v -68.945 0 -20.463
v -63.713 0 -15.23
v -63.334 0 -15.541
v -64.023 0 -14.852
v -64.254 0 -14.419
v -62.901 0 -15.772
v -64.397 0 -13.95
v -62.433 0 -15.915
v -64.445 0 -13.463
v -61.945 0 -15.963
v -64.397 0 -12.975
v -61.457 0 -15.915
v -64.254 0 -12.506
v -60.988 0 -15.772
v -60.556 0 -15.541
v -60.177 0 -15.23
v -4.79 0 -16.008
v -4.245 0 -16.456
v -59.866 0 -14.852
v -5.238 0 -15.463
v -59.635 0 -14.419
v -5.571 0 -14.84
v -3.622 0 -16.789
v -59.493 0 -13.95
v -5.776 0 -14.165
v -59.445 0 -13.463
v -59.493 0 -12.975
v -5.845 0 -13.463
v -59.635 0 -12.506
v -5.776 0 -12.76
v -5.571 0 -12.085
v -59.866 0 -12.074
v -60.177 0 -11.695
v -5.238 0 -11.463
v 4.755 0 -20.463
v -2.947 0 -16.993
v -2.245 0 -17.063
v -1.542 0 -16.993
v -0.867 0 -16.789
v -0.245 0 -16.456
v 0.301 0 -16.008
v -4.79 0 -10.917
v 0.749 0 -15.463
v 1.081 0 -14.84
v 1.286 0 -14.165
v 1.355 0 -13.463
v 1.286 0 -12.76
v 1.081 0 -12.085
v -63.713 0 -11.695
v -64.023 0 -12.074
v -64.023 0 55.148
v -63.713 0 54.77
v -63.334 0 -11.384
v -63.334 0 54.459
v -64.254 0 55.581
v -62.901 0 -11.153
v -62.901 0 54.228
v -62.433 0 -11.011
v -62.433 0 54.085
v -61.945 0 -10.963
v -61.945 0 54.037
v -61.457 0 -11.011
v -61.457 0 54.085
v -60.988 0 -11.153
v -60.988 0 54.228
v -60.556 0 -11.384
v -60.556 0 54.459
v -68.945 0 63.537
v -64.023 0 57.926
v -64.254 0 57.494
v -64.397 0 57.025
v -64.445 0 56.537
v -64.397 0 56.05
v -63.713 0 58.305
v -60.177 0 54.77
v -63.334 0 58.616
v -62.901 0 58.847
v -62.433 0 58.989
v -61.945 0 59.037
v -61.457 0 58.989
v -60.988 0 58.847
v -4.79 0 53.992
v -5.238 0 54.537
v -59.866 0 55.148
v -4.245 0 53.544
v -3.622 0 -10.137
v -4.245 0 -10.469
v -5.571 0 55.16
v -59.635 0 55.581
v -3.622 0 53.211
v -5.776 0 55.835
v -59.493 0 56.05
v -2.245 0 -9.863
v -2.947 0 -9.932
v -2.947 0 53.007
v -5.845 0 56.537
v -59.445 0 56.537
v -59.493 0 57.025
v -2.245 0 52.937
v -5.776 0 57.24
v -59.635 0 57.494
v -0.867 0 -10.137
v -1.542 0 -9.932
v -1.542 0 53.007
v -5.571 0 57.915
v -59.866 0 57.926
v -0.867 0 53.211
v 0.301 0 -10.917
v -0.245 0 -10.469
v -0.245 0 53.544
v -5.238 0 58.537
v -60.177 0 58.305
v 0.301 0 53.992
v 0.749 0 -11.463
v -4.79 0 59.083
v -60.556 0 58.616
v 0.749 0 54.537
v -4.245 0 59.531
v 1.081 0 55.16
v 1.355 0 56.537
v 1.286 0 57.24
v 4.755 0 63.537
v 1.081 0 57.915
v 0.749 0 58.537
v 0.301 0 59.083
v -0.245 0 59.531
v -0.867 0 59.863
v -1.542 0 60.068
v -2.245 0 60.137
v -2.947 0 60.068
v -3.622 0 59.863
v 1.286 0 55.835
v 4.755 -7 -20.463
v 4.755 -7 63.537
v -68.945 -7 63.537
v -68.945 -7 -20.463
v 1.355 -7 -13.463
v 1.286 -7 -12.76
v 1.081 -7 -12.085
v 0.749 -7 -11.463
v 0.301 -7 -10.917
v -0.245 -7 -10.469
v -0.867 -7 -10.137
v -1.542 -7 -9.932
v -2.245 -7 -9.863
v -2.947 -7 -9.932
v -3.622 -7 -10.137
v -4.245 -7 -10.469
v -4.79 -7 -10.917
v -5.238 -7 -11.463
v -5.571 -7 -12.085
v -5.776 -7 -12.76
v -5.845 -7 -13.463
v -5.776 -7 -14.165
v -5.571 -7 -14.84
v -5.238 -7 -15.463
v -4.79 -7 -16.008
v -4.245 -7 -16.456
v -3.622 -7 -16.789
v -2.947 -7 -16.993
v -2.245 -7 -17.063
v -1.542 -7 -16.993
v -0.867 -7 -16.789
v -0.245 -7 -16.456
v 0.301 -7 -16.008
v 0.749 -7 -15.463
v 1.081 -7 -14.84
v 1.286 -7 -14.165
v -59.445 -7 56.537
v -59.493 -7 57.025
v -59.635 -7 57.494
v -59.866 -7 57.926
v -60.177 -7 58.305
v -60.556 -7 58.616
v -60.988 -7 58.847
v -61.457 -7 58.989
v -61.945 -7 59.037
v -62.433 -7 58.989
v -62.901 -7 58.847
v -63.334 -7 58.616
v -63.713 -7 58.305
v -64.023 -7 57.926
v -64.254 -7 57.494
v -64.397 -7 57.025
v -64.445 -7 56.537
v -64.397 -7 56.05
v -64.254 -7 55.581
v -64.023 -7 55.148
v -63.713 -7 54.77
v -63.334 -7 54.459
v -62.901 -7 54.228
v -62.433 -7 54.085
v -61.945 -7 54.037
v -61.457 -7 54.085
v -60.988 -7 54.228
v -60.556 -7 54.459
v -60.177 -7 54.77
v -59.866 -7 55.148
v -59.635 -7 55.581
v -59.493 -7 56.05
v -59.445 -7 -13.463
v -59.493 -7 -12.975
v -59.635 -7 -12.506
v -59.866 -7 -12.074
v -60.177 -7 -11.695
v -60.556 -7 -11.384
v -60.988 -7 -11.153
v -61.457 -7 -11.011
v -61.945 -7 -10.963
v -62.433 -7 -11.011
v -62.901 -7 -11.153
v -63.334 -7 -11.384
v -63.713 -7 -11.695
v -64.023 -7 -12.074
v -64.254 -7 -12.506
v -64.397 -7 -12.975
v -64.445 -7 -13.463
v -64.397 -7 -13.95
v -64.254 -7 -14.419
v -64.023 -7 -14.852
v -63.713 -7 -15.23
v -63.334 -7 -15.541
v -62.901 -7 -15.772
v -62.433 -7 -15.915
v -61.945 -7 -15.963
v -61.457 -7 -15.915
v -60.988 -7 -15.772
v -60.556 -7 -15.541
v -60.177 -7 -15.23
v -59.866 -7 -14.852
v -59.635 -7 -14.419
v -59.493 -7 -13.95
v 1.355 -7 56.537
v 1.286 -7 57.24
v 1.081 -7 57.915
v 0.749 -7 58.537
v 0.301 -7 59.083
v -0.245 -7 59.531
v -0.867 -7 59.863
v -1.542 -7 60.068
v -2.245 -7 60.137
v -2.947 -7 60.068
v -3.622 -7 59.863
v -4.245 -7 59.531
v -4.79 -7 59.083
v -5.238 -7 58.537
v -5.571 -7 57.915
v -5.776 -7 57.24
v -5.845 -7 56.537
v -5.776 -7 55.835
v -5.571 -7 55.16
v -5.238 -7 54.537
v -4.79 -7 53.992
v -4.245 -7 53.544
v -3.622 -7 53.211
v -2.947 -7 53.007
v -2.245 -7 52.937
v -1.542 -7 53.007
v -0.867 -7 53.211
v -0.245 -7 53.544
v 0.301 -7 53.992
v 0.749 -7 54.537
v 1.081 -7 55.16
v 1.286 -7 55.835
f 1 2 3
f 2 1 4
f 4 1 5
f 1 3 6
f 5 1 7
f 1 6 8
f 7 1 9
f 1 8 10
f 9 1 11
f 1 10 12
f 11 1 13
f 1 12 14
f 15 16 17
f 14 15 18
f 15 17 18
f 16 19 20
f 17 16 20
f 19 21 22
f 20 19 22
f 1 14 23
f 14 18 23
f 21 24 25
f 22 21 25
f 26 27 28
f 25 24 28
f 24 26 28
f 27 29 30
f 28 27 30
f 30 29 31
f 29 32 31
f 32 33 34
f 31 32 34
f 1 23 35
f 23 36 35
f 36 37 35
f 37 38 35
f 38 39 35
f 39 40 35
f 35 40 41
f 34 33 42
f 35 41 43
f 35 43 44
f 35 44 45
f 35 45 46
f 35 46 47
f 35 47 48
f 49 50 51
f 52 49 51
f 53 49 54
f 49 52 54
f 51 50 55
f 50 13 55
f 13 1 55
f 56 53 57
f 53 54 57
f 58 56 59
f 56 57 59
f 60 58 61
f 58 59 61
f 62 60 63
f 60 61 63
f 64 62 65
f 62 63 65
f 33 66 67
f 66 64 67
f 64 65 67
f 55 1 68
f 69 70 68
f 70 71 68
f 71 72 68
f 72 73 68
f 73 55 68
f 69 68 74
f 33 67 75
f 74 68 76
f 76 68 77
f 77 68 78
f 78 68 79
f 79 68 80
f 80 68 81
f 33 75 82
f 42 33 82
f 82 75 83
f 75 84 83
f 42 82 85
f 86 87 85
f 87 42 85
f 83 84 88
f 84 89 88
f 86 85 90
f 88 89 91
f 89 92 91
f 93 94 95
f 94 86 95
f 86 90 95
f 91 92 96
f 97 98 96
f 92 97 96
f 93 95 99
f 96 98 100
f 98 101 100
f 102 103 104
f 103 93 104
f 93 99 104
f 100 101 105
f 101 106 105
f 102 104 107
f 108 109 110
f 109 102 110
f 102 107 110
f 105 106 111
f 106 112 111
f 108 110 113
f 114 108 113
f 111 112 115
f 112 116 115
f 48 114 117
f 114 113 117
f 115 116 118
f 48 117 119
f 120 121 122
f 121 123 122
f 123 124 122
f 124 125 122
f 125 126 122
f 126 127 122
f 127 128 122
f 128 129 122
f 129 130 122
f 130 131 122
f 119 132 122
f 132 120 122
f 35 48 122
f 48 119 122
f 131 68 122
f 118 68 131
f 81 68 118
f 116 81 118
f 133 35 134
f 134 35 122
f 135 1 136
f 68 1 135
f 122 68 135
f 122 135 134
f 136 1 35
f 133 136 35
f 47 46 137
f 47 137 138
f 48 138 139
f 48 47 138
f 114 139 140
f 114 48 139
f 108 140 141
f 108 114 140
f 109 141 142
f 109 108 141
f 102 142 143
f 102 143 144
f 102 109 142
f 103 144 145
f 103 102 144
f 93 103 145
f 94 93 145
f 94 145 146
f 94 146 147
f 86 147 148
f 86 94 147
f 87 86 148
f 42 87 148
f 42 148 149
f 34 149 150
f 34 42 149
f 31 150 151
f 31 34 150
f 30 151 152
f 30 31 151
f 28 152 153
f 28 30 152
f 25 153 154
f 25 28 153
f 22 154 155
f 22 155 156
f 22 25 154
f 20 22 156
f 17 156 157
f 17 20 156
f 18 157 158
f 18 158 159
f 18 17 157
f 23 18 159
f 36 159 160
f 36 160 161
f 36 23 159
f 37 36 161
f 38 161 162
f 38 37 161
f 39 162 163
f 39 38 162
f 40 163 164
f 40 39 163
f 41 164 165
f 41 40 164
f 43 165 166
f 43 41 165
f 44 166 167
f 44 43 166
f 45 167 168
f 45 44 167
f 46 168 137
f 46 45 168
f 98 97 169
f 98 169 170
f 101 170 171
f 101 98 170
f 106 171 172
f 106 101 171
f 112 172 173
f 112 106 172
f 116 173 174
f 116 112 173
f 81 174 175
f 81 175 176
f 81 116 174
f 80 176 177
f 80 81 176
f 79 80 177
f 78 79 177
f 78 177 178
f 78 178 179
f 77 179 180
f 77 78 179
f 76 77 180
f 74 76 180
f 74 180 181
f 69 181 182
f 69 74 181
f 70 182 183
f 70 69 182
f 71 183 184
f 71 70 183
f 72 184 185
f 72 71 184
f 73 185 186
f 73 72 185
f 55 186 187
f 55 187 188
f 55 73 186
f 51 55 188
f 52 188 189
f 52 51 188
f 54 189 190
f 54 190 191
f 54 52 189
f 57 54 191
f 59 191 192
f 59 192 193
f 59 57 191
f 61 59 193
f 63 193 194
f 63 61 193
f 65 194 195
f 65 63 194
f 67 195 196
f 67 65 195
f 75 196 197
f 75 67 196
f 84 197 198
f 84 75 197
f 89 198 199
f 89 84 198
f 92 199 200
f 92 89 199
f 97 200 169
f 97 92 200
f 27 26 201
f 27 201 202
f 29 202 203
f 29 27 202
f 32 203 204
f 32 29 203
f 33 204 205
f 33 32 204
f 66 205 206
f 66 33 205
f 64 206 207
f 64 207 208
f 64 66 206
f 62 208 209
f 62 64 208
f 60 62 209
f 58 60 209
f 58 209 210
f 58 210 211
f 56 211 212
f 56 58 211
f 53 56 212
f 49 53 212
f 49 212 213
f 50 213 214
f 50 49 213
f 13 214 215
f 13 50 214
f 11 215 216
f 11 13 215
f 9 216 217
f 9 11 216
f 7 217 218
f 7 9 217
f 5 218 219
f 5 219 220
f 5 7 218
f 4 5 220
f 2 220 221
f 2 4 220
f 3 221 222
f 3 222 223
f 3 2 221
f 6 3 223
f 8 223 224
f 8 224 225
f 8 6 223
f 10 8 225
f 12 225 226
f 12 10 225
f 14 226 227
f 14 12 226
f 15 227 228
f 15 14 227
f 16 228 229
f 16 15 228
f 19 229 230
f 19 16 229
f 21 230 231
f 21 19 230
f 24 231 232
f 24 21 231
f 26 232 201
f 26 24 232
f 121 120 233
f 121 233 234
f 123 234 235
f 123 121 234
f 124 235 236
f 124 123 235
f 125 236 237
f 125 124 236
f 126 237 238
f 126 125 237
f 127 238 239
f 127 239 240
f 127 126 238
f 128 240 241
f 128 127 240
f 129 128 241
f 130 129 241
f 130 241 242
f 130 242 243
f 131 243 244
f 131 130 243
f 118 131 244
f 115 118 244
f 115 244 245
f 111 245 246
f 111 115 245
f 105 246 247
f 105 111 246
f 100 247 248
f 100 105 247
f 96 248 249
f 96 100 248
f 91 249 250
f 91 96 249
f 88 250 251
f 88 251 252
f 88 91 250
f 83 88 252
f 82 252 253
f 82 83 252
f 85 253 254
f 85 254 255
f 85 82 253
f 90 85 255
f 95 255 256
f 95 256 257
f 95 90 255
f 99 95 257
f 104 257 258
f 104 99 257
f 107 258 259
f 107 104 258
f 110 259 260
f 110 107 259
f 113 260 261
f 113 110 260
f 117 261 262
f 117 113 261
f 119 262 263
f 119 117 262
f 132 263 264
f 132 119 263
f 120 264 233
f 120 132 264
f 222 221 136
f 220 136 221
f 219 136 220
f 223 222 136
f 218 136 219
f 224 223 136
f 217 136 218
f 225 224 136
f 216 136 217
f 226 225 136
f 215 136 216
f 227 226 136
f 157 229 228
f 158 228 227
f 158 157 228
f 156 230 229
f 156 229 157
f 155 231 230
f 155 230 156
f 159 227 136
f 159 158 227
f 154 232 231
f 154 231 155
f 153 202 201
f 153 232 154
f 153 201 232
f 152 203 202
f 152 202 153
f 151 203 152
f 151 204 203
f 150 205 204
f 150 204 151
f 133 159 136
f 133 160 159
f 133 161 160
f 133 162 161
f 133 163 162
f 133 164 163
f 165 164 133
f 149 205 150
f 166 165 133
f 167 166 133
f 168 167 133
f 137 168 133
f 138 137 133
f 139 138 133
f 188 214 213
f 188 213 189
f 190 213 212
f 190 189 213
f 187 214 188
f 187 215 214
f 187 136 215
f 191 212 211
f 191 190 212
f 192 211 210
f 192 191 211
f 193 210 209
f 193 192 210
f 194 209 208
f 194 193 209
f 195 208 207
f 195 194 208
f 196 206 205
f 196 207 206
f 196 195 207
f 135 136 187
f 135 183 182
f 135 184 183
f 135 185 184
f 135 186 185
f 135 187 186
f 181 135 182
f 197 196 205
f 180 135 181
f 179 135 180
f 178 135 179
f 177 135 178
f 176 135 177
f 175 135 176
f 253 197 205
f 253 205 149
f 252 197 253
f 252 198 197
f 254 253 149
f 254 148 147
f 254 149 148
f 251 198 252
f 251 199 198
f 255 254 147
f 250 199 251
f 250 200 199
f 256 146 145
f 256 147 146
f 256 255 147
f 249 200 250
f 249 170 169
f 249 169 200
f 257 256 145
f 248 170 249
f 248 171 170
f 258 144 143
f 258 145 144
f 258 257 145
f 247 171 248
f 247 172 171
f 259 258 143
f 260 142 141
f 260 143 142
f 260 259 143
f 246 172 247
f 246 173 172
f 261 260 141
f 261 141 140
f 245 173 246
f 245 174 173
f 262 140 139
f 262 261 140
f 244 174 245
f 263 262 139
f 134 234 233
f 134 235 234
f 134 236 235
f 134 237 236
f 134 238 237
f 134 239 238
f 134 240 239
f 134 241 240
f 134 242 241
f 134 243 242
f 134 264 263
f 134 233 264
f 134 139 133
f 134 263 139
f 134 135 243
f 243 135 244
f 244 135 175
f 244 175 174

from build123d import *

# Parameters (mm, degrees)
F0_W     = 73.7
F0_H     = 84
F0_R     = 2.5
F0_R_2   = 3.6
F1_DEPTH = 7


with BuildPart() as f1:
    # F0 (on Front) → F1 (new body)
    with BuildSketch(Plane.XZ):
        with Locations((-32.094777, 21.537357)):
            Rectangle(F0_W, F0_H)
        with Locations((-61.944777, -13.462643)):
            Circle(F0_R, mode=Mode.SUBTRACT)
        with Locations((-2.244777, -13.462643)):
            Circle(F0_R_2, mode=Mode.SUBTRACT)
        with Locations((-61.944777, 56.537357)):
            Circle(F0_R, mode=Mode.SUBTRACT)
        with Locations((-2.244777, 56.537357)):
            Circle(F0_R_2, mode=Mode.SUBTRACT)
    extrude(amount=F1_DEPTH)


solid = f1.part
